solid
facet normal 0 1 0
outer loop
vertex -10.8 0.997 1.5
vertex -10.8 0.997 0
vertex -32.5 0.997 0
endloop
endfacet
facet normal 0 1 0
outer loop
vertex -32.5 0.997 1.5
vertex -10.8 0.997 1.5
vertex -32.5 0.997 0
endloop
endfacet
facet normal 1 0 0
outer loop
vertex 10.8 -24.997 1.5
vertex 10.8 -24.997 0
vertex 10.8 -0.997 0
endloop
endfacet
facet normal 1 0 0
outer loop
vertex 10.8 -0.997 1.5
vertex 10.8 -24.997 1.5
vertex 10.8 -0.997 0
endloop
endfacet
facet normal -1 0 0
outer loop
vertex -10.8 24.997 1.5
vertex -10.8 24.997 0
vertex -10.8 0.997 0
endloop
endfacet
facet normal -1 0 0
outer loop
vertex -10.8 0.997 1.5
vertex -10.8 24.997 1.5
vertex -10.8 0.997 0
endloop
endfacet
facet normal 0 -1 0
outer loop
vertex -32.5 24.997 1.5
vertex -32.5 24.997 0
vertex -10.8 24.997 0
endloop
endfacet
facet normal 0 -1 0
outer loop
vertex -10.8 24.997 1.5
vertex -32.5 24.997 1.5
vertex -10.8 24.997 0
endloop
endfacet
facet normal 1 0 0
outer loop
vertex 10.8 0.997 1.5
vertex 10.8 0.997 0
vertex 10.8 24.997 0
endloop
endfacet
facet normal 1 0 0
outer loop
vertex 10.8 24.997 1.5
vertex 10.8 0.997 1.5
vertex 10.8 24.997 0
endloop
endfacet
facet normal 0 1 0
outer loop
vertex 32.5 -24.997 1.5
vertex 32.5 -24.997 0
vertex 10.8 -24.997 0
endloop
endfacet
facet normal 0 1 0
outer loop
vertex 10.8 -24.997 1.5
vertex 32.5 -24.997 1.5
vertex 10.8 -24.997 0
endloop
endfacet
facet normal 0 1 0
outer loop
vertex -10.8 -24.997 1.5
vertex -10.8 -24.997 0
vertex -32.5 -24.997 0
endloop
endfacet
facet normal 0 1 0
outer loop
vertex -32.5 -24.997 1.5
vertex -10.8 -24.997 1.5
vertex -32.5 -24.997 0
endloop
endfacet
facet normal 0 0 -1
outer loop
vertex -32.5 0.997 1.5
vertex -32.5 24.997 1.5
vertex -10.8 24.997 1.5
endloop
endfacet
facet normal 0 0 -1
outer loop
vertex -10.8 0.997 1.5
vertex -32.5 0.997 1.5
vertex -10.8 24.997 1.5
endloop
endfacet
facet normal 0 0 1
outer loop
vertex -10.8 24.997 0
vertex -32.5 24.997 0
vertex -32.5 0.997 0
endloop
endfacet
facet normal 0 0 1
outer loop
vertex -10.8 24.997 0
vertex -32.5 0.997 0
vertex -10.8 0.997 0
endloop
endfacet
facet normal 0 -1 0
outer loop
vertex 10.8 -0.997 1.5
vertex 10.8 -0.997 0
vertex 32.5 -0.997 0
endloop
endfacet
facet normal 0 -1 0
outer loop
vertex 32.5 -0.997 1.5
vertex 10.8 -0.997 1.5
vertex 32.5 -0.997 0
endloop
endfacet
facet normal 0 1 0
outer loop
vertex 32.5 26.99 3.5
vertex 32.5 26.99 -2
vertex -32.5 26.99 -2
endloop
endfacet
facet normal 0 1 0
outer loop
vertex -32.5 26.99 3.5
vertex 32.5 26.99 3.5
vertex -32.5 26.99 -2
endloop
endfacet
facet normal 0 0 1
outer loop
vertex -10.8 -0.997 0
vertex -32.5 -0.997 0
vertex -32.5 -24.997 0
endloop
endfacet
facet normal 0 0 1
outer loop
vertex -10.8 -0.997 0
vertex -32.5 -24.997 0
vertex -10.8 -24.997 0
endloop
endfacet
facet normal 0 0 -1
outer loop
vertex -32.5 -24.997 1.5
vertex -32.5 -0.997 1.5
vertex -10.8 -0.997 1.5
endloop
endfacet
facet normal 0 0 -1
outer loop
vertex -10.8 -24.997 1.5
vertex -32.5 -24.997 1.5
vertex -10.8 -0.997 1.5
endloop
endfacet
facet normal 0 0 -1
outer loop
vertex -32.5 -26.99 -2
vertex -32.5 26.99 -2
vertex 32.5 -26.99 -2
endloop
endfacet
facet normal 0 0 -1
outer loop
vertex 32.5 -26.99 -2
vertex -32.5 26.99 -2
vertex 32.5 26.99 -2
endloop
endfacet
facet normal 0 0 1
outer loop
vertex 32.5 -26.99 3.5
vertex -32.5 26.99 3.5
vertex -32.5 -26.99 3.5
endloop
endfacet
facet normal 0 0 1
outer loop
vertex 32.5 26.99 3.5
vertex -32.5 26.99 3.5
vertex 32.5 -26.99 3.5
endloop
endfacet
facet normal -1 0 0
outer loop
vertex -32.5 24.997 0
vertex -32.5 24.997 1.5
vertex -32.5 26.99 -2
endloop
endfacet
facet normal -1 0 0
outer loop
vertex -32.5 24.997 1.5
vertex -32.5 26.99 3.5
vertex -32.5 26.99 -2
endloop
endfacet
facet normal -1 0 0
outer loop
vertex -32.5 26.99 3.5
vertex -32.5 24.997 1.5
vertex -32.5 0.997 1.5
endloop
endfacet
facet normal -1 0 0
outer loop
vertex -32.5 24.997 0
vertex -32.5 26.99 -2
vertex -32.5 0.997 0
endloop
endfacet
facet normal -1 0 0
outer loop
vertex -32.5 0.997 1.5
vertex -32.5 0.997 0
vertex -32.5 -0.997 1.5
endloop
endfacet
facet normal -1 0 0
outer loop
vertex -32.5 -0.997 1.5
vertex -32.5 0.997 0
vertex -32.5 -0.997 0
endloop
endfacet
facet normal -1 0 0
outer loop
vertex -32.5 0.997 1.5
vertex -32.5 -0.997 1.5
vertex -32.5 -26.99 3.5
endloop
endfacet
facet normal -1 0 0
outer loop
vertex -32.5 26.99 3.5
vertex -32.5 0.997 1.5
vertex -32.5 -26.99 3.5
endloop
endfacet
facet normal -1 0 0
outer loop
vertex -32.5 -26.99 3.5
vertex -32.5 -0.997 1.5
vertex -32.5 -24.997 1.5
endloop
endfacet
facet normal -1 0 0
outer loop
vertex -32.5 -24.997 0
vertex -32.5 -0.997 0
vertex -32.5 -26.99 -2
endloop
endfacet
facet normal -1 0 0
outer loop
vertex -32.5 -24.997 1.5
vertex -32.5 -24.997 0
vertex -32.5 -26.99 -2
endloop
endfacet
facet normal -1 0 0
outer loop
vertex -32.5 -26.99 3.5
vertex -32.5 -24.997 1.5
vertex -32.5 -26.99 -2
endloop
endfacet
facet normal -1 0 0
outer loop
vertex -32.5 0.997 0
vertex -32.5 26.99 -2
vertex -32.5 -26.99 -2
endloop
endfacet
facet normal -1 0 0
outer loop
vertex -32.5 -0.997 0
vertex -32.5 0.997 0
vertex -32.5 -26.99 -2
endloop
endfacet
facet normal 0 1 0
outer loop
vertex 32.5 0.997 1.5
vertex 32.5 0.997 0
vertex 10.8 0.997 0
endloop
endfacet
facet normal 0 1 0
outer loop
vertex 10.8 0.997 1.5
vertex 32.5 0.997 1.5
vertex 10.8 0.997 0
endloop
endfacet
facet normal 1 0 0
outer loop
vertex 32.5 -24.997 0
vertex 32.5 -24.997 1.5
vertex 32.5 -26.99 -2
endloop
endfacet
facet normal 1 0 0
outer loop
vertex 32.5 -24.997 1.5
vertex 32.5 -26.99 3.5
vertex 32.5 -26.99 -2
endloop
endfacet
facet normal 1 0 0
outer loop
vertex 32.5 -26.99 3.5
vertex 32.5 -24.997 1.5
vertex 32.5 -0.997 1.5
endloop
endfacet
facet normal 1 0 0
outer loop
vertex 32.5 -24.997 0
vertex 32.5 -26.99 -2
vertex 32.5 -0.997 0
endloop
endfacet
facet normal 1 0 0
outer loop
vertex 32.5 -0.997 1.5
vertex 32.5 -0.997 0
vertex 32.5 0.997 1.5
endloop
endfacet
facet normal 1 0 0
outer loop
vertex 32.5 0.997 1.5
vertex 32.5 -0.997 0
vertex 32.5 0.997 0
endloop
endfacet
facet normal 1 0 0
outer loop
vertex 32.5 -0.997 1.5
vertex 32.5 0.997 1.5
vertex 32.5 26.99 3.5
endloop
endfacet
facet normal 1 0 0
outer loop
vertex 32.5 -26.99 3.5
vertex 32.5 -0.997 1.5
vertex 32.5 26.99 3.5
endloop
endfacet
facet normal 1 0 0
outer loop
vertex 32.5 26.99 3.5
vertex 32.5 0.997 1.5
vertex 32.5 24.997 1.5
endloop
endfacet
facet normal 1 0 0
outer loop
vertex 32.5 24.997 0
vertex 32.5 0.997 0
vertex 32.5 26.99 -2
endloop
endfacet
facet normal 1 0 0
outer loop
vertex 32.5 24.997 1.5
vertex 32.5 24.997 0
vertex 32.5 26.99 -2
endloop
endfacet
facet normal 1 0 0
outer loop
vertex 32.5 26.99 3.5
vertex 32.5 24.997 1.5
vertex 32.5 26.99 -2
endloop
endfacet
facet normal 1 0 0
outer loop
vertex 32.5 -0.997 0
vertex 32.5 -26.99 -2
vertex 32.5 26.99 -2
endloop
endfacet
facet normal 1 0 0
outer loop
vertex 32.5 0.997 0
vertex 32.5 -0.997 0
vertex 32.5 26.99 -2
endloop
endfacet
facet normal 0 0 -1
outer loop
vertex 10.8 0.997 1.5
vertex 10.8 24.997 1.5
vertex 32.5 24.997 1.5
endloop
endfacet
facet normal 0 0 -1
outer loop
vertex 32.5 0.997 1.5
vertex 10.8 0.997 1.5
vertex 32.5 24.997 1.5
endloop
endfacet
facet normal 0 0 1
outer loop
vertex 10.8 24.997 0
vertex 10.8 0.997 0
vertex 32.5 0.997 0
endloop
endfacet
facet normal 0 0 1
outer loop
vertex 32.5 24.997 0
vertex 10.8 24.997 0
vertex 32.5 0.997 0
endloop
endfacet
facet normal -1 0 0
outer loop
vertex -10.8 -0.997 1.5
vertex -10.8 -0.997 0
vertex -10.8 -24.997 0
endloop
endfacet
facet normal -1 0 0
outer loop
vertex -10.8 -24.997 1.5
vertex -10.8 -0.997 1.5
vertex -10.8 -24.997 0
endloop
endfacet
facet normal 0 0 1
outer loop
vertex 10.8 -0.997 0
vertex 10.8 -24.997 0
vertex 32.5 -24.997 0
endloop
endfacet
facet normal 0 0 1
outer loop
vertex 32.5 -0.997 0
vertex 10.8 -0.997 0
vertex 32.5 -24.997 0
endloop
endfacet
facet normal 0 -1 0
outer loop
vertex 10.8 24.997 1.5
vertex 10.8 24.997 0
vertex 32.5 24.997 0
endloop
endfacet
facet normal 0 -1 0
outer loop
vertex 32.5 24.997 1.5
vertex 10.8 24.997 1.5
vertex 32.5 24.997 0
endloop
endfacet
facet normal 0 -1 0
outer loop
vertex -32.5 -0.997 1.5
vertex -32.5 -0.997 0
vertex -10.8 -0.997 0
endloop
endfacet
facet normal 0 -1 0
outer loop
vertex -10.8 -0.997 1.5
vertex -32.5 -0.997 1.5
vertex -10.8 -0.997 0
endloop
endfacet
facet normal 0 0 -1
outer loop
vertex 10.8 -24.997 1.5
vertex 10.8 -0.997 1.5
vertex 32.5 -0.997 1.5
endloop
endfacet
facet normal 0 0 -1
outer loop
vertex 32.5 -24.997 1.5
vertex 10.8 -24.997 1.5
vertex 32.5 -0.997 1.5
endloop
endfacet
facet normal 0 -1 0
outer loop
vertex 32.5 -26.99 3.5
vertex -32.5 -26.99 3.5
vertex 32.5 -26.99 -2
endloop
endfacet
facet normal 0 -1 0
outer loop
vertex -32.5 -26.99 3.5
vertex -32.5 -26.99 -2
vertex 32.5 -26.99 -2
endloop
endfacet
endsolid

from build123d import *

# Parameters (mm, degrees)
F2_W     = 21.7
F2_H     = 24
F3_DEPTH = 2
F4_DEPTH = 1.5
F5_W     = 21.7
F5_H     = 24
F6_DEPTH = 2


with BuildPart() as f3:
    # F2 (on Top) → F3 (new body)
    with BuildSketch(Plane.XY):
        Polygon((32.5, 26.99), (-32.5, 26.99), (-32.5, 24.9966666667), (-10.8, 24.9966666667), (-10.8, 0.9966666667), (-32.5, 0.9966666667), (-32.5, -0.9966666667), (-10.8, -0.9966666667), (-10.8, -24.9966666667), (-32.5, -24.9966666667), (-32.5, -26.99), (32.5, -26.99), (32.5, -24.9966666667), (10.8, -24.9966666667), (10.8, -0.9966666667), (32.5, -0.9966666667), (32.5, 0.9966666667), (10.8, 0.9966666667), (10.8, 24.9966666667), (32.5, 24.9966666667), align=None)
        with Locations((21.65, 12.9966666667)):
            Rectangle(F2_W, F2_H)
        with Locations((-21.65, -12.9966666667)):
            Rectangle(F2_W, F2_H)
        with Locations((-21.65, 12.9966666667)):
            Rectangle(F2_W, F2_H)
        with Locations((21.65, -12.9966666667)):
            Rectangle(F2_W, F2_H)
    extrude(amount=-F3_DEPTH)

    # F2 (on Top) → F4 (join)
    with BuildSketch(Plane.XY):
        Polygon((32.5, 26.99), (-32.5, 26.99), (-32.5, 24.9966666667), (-10.8, 24.9966666667), (-10.8, 0.9966666667), (-32.5, 0.9966666667), (-32.5, -0.9966666667), (-10.8, -0.9966666667), (-10.8, -24.9966666667), (-32.5, -24.9966666667), (-32.5, -26.99), (32.5, -26.99), (32.5, -24.9966666667), (10.8, -24.9966666667), (10.8, -0.9966666667), (32.5, -0.9966666667), (32.5, 0.9966666667), (10.8, 0.9966666667), (10.8, 24.9966666667), (32.5, 24.9966666667), align=None)
    extrude(amount=F4_DEPTH)

    # F5 (on face) → F6 (join)
    with BuildSketch(Plane.XY.offset(1.5)):
        Polygon((10.8, -24.9966666667), (10.8, -0.9966666667), (32.5, -0.9966666667), (32.5, 0.9966666667), (10.8, 0.9966666667), (10.8, 24.9966666667), (32.5, 24.9966666667), (32.5, 26.99), (-32.5, 26.99), (-32.5, 24.9966666667), (-10.8, 24.9966666667), (-10.8, 0.9966666667), (-32.5, 0.9966666667), (-32.5, -0.9966666667), (-10.8, -0.9966666667), (-10.8, -24.9966666667), (-32.5, -24.9966666667), (-32.5, -26.99), (32.5, -26.99), (32.5, -24.9966666667), align=None)
        with Locations((-21.65, 12.9966666667)):
            Rectangle(F5_W, F5_H)
        with Locations((-21.65, -12.9966666667)):
            Rectangle(F5_W, F5_H)
        with Locations((21.65, 12.9966666667)):
            Rectangle(F5_W, F5_H)
        with Locations((21.65, -12.9966666667)):
            Rectangle(F5_W, F5_H)
    extrude(amount=F6_DEPTH)


solid = f3.part
